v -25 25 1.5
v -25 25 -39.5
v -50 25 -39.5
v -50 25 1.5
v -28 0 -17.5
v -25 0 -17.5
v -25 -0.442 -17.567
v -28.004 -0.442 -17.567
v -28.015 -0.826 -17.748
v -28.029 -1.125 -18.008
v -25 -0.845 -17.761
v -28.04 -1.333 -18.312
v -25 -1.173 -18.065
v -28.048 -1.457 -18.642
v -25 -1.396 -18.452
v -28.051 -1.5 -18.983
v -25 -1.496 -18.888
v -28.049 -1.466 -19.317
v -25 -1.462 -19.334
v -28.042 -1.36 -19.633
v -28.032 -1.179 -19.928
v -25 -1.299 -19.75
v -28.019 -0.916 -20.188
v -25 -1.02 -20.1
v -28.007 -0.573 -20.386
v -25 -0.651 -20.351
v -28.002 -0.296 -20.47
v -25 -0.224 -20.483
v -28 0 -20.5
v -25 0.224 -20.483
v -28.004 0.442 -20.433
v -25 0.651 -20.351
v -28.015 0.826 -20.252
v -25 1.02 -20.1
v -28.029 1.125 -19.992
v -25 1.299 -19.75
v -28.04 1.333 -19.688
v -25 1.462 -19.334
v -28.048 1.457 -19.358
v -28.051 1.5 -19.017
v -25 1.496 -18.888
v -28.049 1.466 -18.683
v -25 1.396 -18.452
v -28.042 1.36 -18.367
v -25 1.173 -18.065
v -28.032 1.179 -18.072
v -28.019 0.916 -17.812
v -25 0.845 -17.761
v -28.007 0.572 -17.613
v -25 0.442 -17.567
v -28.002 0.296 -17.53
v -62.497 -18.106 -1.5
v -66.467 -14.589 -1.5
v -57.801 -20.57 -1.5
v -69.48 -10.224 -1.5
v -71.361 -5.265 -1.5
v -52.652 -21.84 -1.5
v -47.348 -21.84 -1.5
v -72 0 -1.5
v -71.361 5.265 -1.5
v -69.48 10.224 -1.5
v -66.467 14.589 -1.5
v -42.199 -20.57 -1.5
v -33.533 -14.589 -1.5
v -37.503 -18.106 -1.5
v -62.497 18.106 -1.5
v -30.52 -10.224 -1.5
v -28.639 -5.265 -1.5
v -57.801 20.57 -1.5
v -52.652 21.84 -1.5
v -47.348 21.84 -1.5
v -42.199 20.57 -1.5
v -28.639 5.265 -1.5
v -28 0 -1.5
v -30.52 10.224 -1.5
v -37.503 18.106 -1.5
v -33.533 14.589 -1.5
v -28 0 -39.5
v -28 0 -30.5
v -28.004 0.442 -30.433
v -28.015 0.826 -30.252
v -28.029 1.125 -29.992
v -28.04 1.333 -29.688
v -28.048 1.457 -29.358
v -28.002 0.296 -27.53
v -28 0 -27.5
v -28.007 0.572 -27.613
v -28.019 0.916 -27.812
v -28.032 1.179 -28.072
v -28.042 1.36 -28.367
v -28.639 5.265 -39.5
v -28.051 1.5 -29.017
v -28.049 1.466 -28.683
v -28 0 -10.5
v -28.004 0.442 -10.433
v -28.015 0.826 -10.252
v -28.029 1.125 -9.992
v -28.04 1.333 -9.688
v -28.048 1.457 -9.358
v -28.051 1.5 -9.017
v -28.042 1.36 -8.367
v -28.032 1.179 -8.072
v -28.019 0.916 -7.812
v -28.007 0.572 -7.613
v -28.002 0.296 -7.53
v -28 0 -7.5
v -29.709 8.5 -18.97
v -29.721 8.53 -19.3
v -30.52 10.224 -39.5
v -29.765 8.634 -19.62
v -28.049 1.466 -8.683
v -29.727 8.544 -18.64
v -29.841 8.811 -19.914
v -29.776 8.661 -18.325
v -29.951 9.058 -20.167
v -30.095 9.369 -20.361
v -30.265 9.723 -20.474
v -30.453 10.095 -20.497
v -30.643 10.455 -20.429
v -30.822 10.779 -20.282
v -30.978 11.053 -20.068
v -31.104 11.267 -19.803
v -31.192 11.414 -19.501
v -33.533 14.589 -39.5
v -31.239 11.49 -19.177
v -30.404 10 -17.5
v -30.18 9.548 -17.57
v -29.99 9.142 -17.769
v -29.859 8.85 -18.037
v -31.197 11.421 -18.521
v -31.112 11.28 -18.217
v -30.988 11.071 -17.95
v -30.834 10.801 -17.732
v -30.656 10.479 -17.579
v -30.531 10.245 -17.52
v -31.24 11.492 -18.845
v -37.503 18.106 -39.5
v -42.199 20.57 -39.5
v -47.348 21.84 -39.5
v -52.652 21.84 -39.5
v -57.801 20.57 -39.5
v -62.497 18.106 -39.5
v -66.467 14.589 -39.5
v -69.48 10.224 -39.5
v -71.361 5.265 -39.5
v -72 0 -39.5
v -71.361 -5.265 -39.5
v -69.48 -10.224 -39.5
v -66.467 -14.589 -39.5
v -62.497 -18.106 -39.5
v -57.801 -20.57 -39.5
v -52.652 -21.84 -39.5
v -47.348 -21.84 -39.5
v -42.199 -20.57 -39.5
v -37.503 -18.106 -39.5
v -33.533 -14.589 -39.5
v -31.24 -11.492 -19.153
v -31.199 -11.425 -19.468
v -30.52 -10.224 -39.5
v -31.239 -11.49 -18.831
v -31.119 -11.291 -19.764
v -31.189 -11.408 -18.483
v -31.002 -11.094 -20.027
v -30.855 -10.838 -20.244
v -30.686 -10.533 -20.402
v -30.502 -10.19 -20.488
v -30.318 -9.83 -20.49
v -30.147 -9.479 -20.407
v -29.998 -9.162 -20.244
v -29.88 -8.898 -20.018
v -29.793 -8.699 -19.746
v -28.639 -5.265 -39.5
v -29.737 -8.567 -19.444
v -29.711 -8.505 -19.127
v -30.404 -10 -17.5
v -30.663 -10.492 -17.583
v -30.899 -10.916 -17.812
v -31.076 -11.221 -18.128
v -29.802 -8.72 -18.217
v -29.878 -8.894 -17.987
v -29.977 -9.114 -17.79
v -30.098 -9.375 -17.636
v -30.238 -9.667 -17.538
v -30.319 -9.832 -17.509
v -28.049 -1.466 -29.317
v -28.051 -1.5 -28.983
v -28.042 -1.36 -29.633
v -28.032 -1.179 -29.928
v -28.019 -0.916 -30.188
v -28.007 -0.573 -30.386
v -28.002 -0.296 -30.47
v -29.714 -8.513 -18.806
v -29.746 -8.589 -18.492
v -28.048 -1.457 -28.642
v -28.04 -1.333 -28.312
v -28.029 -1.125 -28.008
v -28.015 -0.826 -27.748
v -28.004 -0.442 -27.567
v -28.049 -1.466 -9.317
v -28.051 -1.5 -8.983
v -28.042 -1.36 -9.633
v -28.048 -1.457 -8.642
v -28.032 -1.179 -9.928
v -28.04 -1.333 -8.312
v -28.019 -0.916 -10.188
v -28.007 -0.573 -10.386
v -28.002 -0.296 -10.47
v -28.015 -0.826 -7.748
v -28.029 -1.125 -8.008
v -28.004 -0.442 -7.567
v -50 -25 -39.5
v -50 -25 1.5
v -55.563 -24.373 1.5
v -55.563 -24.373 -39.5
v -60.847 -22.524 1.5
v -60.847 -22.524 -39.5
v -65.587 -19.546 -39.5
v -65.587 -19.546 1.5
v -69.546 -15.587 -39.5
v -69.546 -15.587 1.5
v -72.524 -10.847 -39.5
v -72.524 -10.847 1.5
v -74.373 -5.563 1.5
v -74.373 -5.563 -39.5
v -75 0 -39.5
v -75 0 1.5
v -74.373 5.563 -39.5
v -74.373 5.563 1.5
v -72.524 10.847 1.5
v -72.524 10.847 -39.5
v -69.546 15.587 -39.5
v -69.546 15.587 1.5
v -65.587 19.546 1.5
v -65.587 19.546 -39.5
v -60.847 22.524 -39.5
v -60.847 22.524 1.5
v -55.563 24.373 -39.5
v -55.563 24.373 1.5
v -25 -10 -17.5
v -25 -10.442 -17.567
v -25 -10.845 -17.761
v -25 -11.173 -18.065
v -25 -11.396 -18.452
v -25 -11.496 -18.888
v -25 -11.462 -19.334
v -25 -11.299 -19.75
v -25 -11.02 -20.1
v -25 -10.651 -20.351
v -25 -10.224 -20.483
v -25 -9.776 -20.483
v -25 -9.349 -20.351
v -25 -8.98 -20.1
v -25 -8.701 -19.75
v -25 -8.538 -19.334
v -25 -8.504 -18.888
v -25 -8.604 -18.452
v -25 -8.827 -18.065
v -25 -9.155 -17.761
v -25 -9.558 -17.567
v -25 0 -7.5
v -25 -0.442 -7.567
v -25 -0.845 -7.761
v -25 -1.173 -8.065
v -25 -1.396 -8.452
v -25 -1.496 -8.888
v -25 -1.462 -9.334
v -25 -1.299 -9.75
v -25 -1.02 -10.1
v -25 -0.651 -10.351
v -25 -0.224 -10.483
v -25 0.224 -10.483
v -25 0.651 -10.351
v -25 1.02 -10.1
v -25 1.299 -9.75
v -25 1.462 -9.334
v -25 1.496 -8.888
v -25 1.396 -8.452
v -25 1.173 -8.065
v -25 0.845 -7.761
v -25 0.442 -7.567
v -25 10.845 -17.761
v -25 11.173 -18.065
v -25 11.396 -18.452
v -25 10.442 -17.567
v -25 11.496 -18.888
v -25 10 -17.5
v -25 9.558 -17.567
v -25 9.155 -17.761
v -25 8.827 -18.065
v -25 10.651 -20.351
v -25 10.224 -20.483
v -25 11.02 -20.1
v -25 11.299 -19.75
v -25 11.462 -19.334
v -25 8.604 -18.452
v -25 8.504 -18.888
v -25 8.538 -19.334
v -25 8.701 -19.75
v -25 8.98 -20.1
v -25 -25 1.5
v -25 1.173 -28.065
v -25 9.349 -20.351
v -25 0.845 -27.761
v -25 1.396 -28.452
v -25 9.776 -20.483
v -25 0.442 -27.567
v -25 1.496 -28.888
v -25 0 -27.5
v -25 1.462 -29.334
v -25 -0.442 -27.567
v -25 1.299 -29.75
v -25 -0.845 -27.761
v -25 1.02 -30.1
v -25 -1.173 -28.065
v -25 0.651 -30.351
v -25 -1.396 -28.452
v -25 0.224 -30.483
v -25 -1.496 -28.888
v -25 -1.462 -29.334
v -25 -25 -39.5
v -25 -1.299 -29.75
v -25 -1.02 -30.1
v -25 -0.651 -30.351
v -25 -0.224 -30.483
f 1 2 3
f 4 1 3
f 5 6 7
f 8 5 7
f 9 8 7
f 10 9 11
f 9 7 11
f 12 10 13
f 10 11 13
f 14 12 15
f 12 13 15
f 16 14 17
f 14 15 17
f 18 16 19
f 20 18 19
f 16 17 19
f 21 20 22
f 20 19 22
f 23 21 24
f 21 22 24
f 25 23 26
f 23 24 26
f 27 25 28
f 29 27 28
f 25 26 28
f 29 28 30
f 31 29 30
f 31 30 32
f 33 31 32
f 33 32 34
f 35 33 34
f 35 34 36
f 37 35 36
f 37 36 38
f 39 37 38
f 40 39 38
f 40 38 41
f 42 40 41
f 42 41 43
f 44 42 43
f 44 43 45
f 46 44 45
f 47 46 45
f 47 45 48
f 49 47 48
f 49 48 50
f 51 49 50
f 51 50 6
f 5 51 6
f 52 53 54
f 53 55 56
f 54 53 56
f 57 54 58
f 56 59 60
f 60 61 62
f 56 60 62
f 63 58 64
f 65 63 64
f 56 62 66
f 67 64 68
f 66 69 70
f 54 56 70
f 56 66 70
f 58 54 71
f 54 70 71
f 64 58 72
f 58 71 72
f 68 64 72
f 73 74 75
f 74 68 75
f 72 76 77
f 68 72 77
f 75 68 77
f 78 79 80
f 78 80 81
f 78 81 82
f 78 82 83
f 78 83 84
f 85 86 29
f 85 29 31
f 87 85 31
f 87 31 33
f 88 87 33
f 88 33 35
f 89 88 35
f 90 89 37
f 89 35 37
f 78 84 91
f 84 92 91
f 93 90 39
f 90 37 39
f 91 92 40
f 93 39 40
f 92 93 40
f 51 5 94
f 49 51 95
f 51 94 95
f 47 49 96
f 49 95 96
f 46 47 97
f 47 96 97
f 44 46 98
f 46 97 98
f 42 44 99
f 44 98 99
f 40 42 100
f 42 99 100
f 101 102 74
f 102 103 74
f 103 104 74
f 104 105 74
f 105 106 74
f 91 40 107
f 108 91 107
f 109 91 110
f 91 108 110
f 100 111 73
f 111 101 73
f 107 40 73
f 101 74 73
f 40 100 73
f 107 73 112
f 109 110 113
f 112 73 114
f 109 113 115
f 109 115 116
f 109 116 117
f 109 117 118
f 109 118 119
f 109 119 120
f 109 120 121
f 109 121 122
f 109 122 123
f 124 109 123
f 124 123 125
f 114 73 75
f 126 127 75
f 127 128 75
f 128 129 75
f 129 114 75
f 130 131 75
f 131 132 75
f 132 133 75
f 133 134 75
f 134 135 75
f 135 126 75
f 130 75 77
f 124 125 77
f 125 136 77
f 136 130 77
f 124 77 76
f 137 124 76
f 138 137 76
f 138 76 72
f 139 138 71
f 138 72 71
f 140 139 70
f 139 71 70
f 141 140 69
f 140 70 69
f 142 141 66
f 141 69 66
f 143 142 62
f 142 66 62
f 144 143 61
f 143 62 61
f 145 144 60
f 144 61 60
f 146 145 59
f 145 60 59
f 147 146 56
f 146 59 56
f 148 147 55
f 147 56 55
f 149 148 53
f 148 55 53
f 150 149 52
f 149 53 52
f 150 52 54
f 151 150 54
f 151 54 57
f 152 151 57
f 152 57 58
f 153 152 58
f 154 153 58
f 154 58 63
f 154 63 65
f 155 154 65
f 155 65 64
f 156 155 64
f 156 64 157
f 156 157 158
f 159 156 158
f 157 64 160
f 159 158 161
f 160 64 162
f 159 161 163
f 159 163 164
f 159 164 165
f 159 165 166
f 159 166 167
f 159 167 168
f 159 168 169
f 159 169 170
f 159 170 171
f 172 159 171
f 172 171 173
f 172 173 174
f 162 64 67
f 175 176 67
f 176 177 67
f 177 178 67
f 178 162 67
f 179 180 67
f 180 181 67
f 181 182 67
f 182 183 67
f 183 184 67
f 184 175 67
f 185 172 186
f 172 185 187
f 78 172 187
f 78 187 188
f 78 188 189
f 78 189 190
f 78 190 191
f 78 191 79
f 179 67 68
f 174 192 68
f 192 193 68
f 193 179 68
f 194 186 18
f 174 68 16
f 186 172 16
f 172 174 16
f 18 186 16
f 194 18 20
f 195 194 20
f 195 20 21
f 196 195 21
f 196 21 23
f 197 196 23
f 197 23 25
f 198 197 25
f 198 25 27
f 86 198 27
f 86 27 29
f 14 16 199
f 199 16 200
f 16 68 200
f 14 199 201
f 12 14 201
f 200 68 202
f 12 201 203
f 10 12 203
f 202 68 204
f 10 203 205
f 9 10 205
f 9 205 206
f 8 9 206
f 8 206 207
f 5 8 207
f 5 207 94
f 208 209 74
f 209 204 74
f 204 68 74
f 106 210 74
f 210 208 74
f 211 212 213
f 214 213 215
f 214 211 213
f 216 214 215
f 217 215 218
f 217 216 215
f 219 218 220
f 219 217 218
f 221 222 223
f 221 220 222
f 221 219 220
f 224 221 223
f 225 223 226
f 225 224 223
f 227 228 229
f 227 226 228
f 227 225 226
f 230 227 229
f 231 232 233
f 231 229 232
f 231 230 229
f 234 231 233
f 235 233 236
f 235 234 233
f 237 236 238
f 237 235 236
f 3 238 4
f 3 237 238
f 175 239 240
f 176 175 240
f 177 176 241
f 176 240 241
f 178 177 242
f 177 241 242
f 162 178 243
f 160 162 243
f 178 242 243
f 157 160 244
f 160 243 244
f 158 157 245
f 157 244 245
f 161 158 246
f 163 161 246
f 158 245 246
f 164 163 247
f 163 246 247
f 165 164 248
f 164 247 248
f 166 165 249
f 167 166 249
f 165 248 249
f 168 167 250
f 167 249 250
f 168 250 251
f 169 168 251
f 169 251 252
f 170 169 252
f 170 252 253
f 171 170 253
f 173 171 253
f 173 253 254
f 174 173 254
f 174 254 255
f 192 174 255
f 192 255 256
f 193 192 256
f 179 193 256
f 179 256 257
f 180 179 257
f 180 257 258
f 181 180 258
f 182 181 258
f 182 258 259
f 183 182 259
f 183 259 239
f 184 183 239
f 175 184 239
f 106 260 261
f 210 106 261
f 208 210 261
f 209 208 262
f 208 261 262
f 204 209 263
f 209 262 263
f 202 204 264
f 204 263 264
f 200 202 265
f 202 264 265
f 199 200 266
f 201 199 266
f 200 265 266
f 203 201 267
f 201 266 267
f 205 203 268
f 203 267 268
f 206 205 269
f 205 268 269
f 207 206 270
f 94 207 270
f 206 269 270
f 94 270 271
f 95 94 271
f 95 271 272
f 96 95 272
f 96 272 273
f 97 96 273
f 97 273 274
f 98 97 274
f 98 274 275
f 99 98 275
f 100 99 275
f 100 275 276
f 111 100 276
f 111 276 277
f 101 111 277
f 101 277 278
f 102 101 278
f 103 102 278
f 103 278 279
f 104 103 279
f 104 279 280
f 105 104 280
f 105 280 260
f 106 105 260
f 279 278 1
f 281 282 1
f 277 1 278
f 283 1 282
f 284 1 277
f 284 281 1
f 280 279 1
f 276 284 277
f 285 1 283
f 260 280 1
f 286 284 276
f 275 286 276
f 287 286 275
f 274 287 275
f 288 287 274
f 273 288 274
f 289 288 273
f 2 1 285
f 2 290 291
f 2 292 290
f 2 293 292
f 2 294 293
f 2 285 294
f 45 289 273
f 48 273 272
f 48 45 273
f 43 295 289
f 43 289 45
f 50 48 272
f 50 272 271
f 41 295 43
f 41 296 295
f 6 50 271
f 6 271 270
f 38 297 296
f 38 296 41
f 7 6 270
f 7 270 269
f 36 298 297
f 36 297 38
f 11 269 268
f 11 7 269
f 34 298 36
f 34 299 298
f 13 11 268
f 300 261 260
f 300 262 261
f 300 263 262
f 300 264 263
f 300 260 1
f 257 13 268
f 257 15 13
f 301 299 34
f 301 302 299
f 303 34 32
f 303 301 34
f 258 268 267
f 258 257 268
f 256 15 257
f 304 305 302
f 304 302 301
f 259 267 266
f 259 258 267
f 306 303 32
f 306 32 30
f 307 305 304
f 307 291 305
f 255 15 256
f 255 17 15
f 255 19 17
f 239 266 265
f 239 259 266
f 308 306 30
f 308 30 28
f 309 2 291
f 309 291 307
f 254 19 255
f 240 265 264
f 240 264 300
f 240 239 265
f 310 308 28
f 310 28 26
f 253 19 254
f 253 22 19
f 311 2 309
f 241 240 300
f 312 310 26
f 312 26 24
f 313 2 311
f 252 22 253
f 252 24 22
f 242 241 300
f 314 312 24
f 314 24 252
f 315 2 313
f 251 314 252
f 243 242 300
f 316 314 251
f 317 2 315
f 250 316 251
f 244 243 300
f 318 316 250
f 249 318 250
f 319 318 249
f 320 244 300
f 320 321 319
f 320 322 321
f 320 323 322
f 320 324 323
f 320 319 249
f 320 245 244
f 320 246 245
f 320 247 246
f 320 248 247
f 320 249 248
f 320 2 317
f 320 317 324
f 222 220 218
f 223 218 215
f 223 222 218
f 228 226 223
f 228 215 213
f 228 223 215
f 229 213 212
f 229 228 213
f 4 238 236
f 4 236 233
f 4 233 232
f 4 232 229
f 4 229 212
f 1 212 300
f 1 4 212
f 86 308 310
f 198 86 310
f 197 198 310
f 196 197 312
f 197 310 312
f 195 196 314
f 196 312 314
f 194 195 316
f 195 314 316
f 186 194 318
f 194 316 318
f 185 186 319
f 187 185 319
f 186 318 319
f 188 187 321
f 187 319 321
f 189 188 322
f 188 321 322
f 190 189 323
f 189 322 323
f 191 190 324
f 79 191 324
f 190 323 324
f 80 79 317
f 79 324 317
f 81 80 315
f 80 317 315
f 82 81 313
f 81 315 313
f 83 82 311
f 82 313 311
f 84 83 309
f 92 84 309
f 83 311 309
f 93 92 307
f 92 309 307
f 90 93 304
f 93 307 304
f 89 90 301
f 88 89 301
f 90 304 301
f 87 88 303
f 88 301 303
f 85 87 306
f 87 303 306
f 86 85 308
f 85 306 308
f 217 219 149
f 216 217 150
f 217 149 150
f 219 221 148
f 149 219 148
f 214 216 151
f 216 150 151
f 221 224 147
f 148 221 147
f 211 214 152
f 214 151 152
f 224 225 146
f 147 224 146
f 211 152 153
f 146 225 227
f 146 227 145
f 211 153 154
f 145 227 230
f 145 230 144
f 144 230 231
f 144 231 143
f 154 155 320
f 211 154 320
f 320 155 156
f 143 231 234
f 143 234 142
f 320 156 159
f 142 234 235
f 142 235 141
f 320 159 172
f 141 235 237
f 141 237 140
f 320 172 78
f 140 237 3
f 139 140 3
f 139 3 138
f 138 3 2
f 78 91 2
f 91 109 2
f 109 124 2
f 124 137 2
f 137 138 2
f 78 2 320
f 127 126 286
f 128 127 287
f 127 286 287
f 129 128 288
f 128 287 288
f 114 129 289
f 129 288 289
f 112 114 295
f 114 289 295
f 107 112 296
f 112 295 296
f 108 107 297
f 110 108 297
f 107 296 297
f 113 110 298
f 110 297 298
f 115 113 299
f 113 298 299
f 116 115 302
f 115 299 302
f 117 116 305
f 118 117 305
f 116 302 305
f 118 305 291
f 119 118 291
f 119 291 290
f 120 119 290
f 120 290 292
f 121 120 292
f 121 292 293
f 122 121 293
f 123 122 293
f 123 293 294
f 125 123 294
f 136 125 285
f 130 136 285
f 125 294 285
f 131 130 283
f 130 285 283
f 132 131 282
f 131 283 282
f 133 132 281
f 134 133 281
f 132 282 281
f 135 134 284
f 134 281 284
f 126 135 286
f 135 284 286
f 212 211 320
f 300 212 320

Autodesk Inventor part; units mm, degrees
ref_plane "YZ Plane" through (0, 0, 0) normal (1, 0, 0) x (0, 1, 0)
ref_plane "XZ Plane" through (0, 0, 0) normal (0, 1, 0) x (-1, 0, 0)
ref_plane "XY Plane" through (0, 0, 0) normal (0, 0, 1) x (1, 0, 0)
sketch "草圖1" plane through (0, 0, 0) normal (0, 0, 1) x (1, 0, 0)
  line L0 (0, 0) -> (-50, 0) construction
  line L1 (0, 25) -> (-50, 25)
  line L2 (-50, -25) -> (0, -25)
  arc A0 (0, -25) -> (0, 25) centre (0, 0) ccw
  arc A1 (-50, 25) -> (-50, -25) centre (-50, 0) ccw
  line L3 (-25, 25) -> (-25, -25)
  point P0 (-25, 0)
  point P1 (25, 0)
  point P2 (-75, 0)
  dimension "d0" = 50
  dimension "d1" = 100
extrude "擠出1" add sketch "草圖1" along normal mid plane 3 contours L3 L2 A1 L1
sketch "草圖2" plane through (0, 0, 1.5) normal (0, 0, 1) x (1, 0, 0)
  arc A0 (-50, 25) -> (-50, -25) centre (-50, 0) ccw projected
  circle A1 centre (-50, 0) radius 25
  circle A2 centre (-50, 0) radius 22
  line L0 (-50, -25) -> (-25, -25) projected
  line L1 (-25, -25) -> (-25, 25) projected
  line L2 (-25, 25) -> (-50, 25) projected
  arc A3 (-50, 25) -> (-50, -25) centre (-50, 0) ccw projected
  point P0 (0, 0)
  point P1 (-50, 25)
  point P2 (-50, -25)
  dimension "d4" = 3
extrude "擠出2" add sketch "草圖2" against normal blind 41
sketch "草圖3" plane through (-25, -25, -1.5) normal (1, 0, 0) x (0, 0, 1)
  line L0 (-38, -50) -> (3, -50) construction
  line L1 (-38, -50) -> (-38, 0) construction
  line L2 (-38, 0) -> (3, 0) construction
  circle A0 centre (-17.5, -25) radius 1.5
  circle A1 centre (-27.5, -25) radius 1.5
  circle A2 centre (-17.5, -35) radius 1.5
  circle A3 centre (-7.5, -25) radius 1.5
  circle A4 centre (-17.5, -15) radius 1.5
  line L3 (-17.5, -50) -> (-17.5, 0) construction
  line L4 (3, 0) -> (3, -50) projected
  point P0 (1.5, -25)
  point P1 (-17.5, -25)
  dimension "d7" = 3
  dimension "d10" = 360
  dimension "d12" = 10
extrude "擠出3" cut sketch "草圖3" against normal up to surface
properties part number "Arm_5"
